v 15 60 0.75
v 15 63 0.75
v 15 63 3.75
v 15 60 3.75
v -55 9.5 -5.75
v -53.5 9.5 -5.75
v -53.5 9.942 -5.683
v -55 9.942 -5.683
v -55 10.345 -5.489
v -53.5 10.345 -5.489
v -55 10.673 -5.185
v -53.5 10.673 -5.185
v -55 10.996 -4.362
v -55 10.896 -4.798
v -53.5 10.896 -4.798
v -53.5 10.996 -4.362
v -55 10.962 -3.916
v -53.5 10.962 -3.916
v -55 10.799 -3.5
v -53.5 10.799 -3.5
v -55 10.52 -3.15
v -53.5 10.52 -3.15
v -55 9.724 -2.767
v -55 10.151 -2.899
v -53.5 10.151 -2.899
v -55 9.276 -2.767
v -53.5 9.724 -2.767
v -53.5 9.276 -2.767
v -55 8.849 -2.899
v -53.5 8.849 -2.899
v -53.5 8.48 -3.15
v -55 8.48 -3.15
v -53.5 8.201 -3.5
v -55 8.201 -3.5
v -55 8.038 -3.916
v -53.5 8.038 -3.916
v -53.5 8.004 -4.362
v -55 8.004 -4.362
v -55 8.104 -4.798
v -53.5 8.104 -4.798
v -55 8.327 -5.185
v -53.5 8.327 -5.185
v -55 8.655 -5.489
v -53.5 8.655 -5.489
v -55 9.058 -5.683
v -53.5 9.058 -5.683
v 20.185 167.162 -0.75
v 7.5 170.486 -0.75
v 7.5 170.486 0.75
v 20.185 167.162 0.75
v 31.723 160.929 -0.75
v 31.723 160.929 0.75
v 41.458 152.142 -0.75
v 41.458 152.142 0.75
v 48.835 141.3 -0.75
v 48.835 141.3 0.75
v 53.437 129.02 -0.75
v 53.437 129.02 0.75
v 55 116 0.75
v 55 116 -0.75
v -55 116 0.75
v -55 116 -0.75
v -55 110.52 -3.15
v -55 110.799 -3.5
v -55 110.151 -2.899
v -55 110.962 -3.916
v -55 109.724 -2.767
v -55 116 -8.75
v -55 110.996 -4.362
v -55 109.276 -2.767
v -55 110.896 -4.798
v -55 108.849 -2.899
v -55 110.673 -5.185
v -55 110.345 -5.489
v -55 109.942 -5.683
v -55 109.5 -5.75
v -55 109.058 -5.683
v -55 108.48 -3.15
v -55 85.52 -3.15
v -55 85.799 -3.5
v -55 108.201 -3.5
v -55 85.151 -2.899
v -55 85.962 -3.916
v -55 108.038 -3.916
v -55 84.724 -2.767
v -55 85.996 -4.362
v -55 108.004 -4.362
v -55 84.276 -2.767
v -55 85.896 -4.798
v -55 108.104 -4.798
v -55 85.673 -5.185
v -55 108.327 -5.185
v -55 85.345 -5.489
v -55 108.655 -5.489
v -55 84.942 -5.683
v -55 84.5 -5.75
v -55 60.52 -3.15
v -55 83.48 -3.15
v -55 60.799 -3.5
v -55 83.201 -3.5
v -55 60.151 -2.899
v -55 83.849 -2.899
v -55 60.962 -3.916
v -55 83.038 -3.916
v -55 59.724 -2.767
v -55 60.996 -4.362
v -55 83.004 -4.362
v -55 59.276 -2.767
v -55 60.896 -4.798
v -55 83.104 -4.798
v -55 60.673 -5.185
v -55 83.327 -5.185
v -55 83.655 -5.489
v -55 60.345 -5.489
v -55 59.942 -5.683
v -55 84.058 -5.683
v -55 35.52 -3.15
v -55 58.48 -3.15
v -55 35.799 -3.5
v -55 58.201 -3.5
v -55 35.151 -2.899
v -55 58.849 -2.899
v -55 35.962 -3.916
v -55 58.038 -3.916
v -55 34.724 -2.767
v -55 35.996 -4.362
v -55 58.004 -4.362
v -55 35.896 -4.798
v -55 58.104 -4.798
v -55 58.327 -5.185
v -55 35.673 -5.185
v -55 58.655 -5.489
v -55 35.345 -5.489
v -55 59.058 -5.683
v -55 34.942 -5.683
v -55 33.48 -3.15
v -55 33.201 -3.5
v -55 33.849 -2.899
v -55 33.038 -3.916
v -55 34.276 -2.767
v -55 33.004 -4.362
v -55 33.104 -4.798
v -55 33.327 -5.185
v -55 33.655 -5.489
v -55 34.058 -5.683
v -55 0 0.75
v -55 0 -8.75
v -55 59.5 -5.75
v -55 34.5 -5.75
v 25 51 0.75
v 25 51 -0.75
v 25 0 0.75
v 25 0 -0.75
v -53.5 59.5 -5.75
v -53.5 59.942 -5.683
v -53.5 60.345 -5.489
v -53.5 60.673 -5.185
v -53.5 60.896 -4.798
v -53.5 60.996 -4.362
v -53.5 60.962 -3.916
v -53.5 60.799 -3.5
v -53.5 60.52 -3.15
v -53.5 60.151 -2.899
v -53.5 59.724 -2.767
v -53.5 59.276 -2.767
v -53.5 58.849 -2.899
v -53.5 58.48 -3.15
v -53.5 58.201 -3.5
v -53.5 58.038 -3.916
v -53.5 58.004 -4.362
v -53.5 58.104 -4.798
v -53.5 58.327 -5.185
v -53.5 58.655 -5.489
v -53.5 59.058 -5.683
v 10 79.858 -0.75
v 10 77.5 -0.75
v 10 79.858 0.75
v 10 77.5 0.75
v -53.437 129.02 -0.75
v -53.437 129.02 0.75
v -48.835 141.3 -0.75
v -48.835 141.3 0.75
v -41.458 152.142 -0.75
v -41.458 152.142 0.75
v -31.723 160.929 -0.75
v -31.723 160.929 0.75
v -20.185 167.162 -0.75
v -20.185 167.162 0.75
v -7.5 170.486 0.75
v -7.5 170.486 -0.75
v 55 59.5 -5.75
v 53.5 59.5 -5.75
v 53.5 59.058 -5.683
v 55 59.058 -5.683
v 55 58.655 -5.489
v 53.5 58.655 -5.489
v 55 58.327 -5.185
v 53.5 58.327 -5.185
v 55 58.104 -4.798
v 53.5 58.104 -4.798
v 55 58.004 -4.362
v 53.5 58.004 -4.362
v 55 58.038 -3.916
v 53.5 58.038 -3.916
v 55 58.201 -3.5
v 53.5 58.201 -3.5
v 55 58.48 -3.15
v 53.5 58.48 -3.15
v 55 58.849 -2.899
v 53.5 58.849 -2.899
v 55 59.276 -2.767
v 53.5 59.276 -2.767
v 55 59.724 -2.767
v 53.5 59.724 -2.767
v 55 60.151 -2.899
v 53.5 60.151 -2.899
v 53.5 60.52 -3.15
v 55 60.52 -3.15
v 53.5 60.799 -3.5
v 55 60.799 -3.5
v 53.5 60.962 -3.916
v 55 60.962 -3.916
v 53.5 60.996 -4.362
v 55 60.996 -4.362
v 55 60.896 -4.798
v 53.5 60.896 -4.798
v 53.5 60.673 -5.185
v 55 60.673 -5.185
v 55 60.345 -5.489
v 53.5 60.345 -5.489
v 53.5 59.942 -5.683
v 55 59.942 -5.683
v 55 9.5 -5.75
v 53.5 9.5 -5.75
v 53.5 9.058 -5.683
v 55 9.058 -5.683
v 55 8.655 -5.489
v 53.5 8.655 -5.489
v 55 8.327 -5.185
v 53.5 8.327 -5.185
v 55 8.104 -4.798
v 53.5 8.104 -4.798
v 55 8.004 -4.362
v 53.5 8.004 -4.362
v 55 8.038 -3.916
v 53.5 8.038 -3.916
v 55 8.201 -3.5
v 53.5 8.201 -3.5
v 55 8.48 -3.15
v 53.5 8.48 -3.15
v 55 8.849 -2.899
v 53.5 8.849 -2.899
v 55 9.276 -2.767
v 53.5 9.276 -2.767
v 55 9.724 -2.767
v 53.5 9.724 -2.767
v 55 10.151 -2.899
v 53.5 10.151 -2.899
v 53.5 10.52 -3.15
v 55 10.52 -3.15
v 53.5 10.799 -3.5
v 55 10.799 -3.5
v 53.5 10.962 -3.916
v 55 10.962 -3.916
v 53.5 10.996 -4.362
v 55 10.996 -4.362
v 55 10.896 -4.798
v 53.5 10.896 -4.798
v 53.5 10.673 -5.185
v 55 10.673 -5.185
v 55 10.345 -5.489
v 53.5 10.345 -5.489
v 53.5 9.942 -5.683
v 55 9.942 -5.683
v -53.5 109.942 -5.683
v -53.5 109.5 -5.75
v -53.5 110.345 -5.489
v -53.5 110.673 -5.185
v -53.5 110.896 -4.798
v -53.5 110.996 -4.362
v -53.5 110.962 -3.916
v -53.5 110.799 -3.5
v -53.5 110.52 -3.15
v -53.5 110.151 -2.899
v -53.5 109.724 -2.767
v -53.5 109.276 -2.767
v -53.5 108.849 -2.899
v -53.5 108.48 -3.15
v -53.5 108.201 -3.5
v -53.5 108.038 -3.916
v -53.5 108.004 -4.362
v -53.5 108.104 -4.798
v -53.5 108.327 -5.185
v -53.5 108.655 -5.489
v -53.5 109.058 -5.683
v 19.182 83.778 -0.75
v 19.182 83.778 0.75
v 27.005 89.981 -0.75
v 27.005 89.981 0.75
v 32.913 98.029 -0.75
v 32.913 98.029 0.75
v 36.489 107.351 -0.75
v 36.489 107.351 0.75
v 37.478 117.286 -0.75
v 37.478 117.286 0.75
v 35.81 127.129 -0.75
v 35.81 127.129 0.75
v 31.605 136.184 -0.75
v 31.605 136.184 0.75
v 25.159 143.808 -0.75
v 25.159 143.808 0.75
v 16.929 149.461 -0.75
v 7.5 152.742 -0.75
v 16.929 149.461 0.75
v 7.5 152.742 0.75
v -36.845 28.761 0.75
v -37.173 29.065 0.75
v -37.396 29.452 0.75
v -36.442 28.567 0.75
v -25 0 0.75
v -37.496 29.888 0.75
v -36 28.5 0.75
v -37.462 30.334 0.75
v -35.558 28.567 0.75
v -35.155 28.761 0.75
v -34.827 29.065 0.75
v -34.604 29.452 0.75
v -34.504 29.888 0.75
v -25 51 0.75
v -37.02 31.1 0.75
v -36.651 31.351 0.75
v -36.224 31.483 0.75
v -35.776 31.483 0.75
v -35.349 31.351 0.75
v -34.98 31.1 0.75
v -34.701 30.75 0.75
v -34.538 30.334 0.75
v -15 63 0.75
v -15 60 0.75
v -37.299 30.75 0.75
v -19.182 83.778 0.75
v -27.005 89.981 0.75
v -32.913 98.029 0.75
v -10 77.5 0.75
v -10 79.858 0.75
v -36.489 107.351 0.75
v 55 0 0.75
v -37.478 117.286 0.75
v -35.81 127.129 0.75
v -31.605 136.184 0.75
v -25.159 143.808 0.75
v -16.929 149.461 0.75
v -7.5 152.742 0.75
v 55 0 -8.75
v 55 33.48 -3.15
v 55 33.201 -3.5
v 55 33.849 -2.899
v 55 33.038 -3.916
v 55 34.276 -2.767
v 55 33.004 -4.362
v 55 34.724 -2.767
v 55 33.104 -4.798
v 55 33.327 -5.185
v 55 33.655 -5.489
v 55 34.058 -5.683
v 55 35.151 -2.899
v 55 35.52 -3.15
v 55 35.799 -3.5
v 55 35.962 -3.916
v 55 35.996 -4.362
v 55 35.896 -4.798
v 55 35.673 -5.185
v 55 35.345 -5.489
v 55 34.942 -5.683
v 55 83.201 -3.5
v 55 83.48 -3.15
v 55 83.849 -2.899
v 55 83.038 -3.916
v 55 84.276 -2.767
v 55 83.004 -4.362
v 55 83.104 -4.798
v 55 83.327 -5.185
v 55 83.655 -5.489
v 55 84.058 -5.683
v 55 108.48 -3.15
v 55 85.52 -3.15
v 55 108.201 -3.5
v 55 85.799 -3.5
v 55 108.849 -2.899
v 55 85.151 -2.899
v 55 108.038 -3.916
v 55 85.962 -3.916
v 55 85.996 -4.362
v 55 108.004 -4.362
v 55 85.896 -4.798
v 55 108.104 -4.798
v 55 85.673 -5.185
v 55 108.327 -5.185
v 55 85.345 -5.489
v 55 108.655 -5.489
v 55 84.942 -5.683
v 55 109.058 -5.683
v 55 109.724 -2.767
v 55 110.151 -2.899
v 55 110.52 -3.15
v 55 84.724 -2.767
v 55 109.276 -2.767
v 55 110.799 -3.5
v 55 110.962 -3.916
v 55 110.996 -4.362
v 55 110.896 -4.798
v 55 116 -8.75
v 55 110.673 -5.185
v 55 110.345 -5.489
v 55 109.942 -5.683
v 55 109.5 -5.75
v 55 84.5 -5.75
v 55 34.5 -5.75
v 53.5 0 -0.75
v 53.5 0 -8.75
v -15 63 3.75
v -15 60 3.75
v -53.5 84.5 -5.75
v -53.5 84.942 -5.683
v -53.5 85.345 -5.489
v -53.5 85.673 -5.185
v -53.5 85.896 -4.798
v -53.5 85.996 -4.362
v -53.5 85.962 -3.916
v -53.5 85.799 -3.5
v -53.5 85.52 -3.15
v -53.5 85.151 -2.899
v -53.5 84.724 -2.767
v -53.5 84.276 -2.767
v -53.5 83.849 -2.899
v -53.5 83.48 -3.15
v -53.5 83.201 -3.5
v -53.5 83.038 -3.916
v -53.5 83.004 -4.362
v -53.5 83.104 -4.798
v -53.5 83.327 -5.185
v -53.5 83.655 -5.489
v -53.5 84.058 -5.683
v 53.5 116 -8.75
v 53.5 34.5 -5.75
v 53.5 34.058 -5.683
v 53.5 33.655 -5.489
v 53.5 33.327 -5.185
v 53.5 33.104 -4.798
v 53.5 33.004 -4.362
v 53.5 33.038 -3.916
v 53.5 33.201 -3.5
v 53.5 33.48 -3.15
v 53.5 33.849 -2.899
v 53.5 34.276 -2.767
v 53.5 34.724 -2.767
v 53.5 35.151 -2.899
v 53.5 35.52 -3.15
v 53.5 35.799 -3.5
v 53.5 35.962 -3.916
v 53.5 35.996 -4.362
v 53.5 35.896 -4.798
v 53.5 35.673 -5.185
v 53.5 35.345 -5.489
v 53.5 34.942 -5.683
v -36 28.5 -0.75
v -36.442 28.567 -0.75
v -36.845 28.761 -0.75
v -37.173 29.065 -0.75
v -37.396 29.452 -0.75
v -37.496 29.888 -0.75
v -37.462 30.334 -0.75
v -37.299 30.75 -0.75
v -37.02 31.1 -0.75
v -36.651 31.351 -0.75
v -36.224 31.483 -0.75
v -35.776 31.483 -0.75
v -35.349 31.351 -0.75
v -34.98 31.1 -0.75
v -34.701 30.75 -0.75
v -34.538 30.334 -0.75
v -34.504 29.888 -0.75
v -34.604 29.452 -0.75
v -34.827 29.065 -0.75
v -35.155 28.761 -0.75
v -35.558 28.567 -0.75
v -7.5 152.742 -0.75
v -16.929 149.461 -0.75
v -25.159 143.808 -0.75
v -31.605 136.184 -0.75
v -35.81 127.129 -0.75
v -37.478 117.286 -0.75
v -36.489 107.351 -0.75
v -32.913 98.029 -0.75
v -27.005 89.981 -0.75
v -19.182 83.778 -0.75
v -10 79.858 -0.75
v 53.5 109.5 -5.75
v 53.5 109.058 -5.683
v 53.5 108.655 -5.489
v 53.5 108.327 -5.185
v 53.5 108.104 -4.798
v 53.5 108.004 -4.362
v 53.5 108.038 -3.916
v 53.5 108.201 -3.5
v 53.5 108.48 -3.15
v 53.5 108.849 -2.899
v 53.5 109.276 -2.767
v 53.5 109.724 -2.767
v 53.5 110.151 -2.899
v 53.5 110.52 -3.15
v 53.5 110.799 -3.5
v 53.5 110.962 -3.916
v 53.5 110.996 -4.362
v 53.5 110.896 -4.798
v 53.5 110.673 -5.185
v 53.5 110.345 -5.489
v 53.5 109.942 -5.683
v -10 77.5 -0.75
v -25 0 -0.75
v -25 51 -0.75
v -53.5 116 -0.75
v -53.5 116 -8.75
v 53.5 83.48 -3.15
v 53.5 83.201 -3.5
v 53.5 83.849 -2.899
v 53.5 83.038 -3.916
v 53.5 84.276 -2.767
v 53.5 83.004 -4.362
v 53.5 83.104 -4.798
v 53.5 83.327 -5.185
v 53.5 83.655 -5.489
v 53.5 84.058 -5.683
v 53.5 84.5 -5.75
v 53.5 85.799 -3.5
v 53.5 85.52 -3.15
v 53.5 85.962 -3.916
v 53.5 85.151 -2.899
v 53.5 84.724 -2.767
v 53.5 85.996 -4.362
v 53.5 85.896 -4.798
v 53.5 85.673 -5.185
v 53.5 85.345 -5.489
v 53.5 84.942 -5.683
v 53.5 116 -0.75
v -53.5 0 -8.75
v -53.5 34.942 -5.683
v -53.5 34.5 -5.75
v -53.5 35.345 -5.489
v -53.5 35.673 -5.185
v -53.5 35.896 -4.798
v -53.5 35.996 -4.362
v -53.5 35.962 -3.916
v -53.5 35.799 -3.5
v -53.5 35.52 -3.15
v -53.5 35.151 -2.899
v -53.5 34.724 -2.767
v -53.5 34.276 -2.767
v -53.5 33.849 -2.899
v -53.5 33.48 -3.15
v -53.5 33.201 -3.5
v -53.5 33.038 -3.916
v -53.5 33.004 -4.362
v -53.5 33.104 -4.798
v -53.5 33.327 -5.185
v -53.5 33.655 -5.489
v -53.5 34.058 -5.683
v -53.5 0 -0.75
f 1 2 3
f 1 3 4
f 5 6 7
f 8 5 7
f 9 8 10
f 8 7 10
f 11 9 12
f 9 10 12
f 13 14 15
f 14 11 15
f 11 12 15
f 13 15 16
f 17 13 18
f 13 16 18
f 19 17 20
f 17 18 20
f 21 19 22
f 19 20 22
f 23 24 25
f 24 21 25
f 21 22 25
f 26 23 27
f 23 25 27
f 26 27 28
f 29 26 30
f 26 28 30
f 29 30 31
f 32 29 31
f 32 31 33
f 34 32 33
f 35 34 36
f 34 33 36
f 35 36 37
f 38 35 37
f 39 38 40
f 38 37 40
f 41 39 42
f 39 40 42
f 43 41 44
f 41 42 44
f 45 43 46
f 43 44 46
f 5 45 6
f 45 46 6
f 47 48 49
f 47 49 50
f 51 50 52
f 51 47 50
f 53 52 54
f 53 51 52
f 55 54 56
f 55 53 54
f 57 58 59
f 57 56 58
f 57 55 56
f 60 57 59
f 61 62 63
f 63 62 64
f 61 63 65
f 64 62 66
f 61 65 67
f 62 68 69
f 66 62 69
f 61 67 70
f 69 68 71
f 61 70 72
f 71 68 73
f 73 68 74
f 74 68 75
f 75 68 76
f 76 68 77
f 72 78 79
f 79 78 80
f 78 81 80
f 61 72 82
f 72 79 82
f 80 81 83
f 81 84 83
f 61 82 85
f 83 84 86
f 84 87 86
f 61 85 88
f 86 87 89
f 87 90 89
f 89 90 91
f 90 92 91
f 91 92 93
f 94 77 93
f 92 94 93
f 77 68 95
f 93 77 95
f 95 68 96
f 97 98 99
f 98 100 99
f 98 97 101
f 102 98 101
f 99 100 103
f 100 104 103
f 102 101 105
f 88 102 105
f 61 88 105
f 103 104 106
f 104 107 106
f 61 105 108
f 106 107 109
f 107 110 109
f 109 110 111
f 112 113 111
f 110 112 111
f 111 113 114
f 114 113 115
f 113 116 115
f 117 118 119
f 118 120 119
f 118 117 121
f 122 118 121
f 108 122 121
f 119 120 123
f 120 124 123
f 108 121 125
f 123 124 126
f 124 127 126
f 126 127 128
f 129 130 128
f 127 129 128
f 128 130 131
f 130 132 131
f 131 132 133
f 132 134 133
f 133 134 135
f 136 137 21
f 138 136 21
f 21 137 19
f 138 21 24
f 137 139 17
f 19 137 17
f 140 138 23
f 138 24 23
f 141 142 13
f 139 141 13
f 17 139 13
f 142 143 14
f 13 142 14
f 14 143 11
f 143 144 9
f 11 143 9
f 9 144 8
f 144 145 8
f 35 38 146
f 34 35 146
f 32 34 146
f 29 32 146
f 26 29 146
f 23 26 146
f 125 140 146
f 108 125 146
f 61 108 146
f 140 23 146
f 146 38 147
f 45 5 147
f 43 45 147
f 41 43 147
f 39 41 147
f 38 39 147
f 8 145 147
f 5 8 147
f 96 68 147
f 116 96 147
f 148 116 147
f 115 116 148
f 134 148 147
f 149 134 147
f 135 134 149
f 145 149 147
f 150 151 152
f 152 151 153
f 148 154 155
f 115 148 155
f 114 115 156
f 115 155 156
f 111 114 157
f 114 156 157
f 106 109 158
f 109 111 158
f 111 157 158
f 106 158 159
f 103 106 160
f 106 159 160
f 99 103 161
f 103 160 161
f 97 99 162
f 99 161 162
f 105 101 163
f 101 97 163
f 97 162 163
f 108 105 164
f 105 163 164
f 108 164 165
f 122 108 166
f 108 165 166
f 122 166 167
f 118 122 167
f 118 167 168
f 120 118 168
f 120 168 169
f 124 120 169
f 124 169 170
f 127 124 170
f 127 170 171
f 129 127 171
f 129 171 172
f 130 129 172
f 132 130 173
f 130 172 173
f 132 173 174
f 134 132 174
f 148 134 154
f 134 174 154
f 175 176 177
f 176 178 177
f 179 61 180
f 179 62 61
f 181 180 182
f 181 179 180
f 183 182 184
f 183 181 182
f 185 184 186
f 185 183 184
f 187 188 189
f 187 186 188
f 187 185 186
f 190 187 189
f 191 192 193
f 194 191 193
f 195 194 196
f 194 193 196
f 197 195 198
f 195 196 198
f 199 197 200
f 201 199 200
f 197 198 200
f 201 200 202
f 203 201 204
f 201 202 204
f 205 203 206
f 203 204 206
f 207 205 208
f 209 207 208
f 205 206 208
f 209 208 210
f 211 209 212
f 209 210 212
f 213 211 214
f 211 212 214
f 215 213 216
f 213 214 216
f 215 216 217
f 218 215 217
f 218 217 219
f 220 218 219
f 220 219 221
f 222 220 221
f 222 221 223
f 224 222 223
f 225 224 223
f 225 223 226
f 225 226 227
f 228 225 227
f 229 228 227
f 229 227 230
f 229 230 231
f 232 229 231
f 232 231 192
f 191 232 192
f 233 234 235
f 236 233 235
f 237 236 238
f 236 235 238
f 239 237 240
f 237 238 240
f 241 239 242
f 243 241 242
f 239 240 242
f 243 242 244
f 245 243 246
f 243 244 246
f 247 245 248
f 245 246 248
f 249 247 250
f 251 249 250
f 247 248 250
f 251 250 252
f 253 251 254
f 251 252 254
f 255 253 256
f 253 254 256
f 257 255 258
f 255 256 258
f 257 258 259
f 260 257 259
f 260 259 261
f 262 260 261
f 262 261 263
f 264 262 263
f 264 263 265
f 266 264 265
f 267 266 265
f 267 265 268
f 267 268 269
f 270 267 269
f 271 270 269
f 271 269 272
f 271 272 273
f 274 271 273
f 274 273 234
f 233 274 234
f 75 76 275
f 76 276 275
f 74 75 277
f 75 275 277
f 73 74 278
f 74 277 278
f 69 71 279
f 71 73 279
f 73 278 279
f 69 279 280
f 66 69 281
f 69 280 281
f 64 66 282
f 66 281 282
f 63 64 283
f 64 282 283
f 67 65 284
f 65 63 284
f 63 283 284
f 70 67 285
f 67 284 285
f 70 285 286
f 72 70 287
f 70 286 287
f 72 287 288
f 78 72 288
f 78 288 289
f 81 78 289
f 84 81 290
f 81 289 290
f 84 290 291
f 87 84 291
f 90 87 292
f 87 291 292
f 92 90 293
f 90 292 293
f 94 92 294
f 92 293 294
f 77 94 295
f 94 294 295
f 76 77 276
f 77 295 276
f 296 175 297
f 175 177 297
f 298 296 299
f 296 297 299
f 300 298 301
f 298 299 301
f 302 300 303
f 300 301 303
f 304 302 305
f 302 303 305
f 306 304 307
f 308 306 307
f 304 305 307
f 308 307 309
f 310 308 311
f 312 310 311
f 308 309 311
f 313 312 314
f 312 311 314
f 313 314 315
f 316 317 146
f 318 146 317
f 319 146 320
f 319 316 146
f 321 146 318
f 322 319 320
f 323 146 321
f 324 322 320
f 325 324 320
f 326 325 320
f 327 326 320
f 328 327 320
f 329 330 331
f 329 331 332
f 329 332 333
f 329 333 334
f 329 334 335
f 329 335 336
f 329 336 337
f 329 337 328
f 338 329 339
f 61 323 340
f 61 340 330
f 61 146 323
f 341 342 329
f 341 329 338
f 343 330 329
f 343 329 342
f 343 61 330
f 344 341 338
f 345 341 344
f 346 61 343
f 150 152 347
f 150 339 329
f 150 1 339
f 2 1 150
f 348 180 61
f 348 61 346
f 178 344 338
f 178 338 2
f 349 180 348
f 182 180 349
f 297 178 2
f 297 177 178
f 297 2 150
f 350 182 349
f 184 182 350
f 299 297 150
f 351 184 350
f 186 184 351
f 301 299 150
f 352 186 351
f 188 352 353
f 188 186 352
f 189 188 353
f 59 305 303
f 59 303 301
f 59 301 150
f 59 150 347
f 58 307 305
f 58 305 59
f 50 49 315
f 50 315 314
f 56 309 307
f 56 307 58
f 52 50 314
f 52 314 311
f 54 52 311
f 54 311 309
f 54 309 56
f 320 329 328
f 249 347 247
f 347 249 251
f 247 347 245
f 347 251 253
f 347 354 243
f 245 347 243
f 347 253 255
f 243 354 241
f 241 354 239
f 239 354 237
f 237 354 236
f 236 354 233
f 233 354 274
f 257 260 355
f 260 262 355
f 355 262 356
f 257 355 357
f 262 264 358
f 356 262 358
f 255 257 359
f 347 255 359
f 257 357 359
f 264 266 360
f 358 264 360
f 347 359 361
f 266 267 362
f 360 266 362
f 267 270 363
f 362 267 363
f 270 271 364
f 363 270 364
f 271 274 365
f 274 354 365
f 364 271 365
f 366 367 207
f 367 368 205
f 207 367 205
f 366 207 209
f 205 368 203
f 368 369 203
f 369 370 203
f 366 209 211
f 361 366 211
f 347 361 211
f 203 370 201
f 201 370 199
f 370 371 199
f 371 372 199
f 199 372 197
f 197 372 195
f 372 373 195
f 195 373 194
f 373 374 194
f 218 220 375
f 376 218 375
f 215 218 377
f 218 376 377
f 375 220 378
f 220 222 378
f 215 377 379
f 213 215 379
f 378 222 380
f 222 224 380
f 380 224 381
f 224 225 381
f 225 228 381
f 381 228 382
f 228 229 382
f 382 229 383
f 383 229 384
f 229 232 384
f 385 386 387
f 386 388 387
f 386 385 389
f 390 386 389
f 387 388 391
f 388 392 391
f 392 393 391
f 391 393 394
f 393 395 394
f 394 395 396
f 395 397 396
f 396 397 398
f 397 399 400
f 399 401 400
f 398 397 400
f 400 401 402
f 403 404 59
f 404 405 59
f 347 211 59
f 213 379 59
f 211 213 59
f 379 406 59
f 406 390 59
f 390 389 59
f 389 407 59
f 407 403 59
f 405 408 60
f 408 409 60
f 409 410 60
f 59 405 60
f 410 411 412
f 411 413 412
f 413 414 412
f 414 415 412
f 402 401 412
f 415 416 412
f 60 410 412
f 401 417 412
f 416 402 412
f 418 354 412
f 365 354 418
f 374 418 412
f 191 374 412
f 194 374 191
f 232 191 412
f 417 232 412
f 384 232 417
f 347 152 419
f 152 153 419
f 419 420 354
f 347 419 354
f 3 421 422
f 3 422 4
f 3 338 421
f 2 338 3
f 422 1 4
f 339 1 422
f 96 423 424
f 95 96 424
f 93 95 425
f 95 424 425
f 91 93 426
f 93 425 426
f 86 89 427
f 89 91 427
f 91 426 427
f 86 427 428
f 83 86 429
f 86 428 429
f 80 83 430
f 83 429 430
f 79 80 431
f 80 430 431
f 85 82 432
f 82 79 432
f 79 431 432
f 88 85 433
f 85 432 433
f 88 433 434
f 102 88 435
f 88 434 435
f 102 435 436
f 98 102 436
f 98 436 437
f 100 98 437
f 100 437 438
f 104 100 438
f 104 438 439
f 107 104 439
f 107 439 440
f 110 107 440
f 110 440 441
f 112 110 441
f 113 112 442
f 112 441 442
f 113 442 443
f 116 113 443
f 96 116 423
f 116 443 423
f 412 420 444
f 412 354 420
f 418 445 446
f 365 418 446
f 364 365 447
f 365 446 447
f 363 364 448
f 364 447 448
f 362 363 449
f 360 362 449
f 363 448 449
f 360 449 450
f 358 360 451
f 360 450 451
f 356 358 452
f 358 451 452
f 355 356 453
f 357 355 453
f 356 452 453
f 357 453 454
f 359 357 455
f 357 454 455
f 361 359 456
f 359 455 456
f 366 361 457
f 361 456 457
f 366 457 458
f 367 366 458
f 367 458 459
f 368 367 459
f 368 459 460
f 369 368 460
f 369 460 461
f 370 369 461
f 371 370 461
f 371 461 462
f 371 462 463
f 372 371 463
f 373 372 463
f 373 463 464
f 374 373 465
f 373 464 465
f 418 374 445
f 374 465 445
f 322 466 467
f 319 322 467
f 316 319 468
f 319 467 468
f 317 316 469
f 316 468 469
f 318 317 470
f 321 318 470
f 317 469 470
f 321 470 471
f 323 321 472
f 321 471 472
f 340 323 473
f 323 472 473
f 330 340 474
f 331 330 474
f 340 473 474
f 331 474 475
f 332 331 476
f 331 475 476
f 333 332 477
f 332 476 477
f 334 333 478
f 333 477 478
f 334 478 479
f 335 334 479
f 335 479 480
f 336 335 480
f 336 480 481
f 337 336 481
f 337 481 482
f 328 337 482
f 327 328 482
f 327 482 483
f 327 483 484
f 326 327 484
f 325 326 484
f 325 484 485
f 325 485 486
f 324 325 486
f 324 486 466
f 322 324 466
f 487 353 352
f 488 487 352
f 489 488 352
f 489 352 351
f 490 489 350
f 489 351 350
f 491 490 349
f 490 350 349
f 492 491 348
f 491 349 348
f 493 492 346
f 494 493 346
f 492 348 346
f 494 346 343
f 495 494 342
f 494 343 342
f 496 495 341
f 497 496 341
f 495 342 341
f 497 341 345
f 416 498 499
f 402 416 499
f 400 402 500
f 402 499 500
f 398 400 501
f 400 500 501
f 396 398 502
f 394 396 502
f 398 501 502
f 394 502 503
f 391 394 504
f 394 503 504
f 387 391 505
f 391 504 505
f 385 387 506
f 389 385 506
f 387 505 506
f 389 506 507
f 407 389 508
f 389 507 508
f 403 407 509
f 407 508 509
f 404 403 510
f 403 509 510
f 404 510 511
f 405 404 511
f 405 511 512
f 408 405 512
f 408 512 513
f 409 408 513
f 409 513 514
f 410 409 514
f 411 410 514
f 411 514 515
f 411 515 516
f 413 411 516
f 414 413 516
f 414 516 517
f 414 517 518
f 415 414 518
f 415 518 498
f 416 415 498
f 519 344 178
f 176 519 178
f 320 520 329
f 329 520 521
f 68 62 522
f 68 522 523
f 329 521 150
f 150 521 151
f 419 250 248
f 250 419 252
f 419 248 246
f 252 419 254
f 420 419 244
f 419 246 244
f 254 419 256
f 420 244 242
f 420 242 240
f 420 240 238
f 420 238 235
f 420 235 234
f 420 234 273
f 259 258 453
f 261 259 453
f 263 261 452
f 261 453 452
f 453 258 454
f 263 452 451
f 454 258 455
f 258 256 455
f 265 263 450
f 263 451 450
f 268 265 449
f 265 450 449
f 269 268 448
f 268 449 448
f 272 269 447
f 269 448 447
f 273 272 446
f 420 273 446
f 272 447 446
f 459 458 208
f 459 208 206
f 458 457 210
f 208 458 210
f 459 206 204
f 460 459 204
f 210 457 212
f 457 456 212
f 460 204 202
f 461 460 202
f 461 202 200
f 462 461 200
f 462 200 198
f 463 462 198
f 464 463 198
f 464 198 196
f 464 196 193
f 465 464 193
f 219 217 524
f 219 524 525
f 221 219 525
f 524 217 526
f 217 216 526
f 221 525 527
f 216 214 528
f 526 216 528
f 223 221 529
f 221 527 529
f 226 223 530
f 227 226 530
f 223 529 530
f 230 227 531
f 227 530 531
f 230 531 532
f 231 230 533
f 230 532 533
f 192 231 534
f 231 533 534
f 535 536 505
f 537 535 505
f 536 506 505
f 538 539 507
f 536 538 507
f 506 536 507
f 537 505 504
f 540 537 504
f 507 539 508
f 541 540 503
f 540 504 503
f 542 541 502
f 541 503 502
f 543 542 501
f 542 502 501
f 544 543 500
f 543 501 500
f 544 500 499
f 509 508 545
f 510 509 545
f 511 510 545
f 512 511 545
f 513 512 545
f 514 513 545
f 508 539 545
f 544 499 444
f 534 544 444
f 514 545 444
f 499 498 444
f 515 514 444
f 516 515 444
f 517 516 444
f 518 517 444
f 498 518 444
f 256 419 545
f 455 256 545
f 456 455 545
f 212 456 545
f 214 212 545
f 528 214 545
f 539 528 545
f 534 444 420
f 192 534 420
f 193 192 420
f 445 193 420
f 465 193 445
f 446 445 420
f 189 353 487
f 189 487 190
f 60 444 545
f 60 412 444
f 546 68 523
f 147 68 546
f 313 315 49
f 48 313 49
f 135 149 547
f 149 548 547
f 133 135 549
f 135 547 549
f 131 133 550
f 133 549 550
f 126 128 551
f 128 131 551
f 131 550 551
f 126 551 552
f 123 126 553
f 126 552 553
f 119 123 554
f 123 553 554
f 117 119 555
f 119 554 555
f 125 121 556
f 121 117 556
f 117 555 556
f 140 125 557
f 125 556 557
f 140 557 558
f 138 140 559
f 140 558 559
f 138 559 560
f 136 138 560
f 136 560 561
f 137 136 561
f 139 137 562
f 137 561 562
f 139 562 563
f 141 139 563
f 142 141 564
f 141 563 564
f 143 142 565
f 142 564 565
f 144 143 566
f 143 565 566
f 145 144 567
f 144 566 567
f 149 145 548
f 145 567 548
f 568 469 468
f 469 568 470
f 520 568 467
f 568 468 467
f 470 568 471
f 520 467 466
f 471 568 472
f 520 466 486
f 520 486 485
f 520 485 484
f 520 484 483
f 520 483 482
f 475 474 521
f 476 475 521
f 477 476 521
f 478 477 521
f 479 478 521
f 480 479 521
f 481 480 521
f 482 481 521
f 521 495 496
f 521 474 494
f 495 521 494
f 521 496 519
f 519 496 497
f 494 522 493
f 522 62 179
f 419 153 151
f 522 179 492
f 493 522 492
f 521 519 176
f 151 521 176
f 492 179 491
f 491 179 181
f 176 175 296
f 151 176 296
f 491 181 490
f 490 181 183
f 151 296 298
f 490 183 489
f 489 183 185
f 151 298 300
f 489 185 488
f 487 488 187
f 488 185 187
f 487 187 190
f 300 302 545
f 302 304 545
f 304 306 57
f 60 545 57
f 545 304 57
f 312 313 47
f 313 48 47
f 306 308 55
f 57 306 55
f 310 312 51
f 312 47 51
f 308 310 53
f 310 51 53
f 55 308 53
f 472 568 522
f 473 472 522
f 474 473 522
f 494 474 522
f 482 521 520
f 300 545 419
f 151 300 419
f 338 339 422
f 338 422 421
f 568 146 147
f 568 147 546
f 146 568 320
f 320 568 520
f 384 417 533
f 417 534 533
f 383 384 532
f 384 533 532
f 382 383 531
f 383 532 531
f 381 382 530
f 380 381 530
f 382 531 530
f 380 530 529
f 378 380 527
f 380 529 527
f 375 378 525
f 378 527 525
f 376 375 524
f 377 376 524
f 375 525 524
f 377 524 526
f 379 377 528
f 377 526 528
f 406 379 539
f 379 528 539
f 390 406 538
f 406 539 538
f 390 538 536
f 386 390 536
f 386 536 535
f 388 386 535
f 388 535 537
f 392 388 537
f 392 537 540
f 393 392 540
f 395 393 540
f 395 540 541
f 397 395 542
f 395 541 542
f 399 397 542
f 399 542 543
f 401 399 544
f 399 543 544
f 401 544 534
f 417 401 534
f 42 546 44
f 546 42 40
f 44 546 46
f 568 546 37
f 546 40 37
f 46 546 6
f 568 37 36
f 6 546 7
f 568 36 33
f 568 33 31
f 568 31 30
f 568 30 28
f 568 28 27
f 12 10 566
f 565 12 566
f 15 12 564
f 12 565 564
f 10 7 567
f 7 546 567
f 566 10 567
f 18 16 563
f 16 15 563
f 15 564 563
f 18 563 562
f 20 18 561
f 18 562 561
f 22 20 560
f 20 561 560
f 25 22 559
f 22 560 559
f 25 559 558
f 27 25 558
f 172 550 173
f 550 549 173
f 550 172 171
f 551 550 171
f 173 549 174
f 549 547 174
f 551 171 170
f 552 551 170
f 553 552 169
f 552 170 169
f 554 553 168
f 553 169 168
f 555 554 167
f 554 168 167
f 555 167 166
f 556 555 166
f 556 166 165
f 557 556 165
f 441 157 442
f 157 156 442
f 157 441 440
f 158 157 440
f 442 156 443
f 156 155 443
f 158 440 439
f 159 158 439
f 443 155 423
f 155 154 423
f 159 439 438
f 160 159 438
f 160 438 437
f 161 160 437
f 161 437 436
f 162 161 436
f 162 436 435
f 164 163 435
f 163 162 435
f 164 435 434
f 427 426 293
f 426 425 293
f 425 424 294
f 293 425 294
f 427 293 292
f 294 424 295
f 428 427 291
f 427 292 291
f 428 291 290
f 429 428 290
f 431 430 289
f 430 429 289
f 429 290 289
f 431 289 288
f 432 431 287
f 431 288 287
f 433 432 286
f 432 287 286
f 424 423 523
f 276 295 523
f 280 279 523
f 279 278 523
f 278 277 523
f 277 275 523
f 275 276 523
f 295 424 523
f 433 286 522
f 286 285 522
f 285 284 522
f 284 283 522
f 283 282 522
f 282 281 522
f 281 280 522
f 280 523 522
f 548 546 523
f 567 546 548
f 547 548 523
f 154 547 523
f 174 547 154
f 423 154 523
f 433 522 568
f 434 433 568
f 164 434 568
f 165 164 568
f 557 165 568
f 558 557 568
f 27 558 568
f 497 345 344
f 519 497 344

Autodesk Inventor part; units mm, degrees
ref_plane "YZ Plane" through (0, 0, 0) normal (1, 0, 0) x (0, 1, 0)
ref_plane "XZ Plane" through (0, 0, 0) normal (0, 1, 0) x (-1, 0, 0)
ref_plane "XY Plane" through (0, 0, 0) normal (0, 0, 1) x (1, 0, 0)
sketch "Skizze1" plane through (0, 0, 0) normal (0, 0, 1) x (1, 0, 0)
  line L0 (-25, 0) -> (-25, 51)
  line L1 (-25, 51) -> (25, 51)
  line L2 (25, 51) -> (25, 0)
  line L3 (25, 0) -> (55, 0)
  line L4 (55, 0) -> (55, 116)
  arc A0 (55, 116) -> (-55, 116) centre (0, 116) ccw
  line L5 (-55, 116) -> (-55, 0)
  line L6 (-55, 0) -> (-25, 0)
  point P0 (0, 0)
  point P1 (0, 51)
  point P2 (-40, 0)
  dimension "d0" = 25
  dimension "d1" = 51
  dimension "d2" = 116
  dimension "d3" = 55
extrude "Extrusion1" add sketch "Skizze1" along normal mid plane 1.5
sketch "Skizze2" plane through (0, 0, 0.75) normal (0, 0, 1) x (1, 0, 0)
  line L0 (-25, 51) -> (25, 51) projected
  line L1 (25, 51) -> (25, 0) projected
  line L2 (25, 0) -> (55, 0) projected
  line L3 (55, 0) -> (55, 116) projected
  arc A0 (55, 116) -> (-55, 116) centre (0, 116) ccw projected
  line L4 (-55, 116) -> (-55, 0) projected
  line L5 (-55, 0) -> (-25, 0) projected
  line L6 (-25, 0) -> (-25, 51) projected
  circle A1 centre (0, 116) radius 37.5
  point P0 (0, 0)
  dimension "d6" = 75
extrude "Extrusion2" cut sketch "Skizze2" against normal up to surface (1.5 mm away) contours A1
sketch "Skizze3" plane through (0, 0, 0.75) normal (0, 0, 1) x (1, 0, 0)
  arc A0 (55, 116) -> (-55, 116) centre (0, 116) ccw projected
  circle A1 centre (0, 116) radius 37.5 projected
  line L0 (-7.5, 152.7423) -> (-7.5, 170.4862)
  line L1 (7.5, 152.7423) -> (7.5, 170.4862)
  line L2 (0, 116) -> (0, 135.7591) construction
  line L3 (-10, 79.8579) -> (-10, 77.5)
  line L4 (-10, 77.5) -> (10, 77.5)
  line L5 (10, 77.5) -> (10, 79.8579)
  point P0 (0, 0)
  dimension "d9" = 15
  dimension "d12" = 20
  dimension "d13" = 1
extrude "Extrusion3" cut sketch "Skizze3" against normal up to surface (1.5 mm away) contours L1 A1 L0 A0
extrude "Extrusion4" cut sketch "Skizze3" against normal up to surface (1.5 mm away) contours A1 L5 L4 L3
sketch "Skizze5" plane through (0, 0, 0.75) normal (0, 0, 1) x (1, 0, 0)
  line L0 (-15, 63) -> (15, 63)
  line L1 (15, 63) -> (15, 60)
  line L2 (15, 60) -> (-15, 60)
  line L3 (-15, 60) -> (-15, 63)
  point P0 (0, 0)
  point P1 (0, 60)
  dimension "d16" = 3
  dimension "d17" = 30
  dimension "d18" = 60
extrude "Extrusion5" add sketch "Skizze5" along normal blind 3
sketch "Sketch9" plane through (55, 0, 0.75) normal (1, 0, 0) x (0, 0, -1)
  line L0 (1.5, 116) -> (1.5, 0) projected
  line L1 (0, 0) -> (0, 116) projected
  line L2 (1.5, 116) -> (0, 116) projected
  line L3 (1.5, 0) -> (0, 0) projected
  line L4 (9.5, 0) -> (9.5, 116)
  line L5 (1.5, 116) -> (1.5, 0)
  line L6 (9.5, 116) -> (0, 116)
  line L7 (0, 0) -> (9.5, 0)
  point P0 (0.75, 0)
  dimension "d39" = 8
extrude "Extrusion7" add sketch "Sketch9" against normal blind 1.5
sketch "Sketch8" plane through (55, 0, 0.75) normal (1, 0, 0) x (0, 0, -1)
  line L0 (0, 0) -> (0, 116) projected
  point P0 (0.75, 0)
  point P1 (5, 109.5)
  point P2 (5, 84.5)
  point P3 (5, 59.5)
  point P4 (5, 34.5)
  point P5 (5, 9.5)
  dimension "d26" = 25
  dimension "d27" = 25
  dimension "d28" = 25
  dimension "d29" = 25
  dimension "d30" = 5
hole "Hole1" at (55, 109.5, -4.25) at (55, 84.5, -4.25) at (55, 59.5, -4.25) at (55, 34.5, -4.25) at (55, 9.5, -4.25) direction (-1, 0, 0) diameter 3 depth 1.5
mirror "Mirror1" about plane through (0, 0, 0) normal (1, 0, 0) of "Hole1", "Extrusion7"
sketch "Sketch10" plane through (0, 0, 0.75) normal (0, 0, 1) x (1, 0, 0)
  line L0 (-55, 0) -> (-25, 0) projected
  line L1 (-55, 116) -> (-55, 0) projected
  point P0 (0, 0)
  point P1 (-36, 30)
  dimension "d42" = 30
  dimension "d43" = 19
hole "Hole2" at (-36, 30, 0.75) direction (0, 0, -1) diameter 3 depth 1.5
equation "\"d27\" = d26"
equation "\"d28\" = d26"
equation "\"d29\" = d26"
properties part number "1 part 06"
